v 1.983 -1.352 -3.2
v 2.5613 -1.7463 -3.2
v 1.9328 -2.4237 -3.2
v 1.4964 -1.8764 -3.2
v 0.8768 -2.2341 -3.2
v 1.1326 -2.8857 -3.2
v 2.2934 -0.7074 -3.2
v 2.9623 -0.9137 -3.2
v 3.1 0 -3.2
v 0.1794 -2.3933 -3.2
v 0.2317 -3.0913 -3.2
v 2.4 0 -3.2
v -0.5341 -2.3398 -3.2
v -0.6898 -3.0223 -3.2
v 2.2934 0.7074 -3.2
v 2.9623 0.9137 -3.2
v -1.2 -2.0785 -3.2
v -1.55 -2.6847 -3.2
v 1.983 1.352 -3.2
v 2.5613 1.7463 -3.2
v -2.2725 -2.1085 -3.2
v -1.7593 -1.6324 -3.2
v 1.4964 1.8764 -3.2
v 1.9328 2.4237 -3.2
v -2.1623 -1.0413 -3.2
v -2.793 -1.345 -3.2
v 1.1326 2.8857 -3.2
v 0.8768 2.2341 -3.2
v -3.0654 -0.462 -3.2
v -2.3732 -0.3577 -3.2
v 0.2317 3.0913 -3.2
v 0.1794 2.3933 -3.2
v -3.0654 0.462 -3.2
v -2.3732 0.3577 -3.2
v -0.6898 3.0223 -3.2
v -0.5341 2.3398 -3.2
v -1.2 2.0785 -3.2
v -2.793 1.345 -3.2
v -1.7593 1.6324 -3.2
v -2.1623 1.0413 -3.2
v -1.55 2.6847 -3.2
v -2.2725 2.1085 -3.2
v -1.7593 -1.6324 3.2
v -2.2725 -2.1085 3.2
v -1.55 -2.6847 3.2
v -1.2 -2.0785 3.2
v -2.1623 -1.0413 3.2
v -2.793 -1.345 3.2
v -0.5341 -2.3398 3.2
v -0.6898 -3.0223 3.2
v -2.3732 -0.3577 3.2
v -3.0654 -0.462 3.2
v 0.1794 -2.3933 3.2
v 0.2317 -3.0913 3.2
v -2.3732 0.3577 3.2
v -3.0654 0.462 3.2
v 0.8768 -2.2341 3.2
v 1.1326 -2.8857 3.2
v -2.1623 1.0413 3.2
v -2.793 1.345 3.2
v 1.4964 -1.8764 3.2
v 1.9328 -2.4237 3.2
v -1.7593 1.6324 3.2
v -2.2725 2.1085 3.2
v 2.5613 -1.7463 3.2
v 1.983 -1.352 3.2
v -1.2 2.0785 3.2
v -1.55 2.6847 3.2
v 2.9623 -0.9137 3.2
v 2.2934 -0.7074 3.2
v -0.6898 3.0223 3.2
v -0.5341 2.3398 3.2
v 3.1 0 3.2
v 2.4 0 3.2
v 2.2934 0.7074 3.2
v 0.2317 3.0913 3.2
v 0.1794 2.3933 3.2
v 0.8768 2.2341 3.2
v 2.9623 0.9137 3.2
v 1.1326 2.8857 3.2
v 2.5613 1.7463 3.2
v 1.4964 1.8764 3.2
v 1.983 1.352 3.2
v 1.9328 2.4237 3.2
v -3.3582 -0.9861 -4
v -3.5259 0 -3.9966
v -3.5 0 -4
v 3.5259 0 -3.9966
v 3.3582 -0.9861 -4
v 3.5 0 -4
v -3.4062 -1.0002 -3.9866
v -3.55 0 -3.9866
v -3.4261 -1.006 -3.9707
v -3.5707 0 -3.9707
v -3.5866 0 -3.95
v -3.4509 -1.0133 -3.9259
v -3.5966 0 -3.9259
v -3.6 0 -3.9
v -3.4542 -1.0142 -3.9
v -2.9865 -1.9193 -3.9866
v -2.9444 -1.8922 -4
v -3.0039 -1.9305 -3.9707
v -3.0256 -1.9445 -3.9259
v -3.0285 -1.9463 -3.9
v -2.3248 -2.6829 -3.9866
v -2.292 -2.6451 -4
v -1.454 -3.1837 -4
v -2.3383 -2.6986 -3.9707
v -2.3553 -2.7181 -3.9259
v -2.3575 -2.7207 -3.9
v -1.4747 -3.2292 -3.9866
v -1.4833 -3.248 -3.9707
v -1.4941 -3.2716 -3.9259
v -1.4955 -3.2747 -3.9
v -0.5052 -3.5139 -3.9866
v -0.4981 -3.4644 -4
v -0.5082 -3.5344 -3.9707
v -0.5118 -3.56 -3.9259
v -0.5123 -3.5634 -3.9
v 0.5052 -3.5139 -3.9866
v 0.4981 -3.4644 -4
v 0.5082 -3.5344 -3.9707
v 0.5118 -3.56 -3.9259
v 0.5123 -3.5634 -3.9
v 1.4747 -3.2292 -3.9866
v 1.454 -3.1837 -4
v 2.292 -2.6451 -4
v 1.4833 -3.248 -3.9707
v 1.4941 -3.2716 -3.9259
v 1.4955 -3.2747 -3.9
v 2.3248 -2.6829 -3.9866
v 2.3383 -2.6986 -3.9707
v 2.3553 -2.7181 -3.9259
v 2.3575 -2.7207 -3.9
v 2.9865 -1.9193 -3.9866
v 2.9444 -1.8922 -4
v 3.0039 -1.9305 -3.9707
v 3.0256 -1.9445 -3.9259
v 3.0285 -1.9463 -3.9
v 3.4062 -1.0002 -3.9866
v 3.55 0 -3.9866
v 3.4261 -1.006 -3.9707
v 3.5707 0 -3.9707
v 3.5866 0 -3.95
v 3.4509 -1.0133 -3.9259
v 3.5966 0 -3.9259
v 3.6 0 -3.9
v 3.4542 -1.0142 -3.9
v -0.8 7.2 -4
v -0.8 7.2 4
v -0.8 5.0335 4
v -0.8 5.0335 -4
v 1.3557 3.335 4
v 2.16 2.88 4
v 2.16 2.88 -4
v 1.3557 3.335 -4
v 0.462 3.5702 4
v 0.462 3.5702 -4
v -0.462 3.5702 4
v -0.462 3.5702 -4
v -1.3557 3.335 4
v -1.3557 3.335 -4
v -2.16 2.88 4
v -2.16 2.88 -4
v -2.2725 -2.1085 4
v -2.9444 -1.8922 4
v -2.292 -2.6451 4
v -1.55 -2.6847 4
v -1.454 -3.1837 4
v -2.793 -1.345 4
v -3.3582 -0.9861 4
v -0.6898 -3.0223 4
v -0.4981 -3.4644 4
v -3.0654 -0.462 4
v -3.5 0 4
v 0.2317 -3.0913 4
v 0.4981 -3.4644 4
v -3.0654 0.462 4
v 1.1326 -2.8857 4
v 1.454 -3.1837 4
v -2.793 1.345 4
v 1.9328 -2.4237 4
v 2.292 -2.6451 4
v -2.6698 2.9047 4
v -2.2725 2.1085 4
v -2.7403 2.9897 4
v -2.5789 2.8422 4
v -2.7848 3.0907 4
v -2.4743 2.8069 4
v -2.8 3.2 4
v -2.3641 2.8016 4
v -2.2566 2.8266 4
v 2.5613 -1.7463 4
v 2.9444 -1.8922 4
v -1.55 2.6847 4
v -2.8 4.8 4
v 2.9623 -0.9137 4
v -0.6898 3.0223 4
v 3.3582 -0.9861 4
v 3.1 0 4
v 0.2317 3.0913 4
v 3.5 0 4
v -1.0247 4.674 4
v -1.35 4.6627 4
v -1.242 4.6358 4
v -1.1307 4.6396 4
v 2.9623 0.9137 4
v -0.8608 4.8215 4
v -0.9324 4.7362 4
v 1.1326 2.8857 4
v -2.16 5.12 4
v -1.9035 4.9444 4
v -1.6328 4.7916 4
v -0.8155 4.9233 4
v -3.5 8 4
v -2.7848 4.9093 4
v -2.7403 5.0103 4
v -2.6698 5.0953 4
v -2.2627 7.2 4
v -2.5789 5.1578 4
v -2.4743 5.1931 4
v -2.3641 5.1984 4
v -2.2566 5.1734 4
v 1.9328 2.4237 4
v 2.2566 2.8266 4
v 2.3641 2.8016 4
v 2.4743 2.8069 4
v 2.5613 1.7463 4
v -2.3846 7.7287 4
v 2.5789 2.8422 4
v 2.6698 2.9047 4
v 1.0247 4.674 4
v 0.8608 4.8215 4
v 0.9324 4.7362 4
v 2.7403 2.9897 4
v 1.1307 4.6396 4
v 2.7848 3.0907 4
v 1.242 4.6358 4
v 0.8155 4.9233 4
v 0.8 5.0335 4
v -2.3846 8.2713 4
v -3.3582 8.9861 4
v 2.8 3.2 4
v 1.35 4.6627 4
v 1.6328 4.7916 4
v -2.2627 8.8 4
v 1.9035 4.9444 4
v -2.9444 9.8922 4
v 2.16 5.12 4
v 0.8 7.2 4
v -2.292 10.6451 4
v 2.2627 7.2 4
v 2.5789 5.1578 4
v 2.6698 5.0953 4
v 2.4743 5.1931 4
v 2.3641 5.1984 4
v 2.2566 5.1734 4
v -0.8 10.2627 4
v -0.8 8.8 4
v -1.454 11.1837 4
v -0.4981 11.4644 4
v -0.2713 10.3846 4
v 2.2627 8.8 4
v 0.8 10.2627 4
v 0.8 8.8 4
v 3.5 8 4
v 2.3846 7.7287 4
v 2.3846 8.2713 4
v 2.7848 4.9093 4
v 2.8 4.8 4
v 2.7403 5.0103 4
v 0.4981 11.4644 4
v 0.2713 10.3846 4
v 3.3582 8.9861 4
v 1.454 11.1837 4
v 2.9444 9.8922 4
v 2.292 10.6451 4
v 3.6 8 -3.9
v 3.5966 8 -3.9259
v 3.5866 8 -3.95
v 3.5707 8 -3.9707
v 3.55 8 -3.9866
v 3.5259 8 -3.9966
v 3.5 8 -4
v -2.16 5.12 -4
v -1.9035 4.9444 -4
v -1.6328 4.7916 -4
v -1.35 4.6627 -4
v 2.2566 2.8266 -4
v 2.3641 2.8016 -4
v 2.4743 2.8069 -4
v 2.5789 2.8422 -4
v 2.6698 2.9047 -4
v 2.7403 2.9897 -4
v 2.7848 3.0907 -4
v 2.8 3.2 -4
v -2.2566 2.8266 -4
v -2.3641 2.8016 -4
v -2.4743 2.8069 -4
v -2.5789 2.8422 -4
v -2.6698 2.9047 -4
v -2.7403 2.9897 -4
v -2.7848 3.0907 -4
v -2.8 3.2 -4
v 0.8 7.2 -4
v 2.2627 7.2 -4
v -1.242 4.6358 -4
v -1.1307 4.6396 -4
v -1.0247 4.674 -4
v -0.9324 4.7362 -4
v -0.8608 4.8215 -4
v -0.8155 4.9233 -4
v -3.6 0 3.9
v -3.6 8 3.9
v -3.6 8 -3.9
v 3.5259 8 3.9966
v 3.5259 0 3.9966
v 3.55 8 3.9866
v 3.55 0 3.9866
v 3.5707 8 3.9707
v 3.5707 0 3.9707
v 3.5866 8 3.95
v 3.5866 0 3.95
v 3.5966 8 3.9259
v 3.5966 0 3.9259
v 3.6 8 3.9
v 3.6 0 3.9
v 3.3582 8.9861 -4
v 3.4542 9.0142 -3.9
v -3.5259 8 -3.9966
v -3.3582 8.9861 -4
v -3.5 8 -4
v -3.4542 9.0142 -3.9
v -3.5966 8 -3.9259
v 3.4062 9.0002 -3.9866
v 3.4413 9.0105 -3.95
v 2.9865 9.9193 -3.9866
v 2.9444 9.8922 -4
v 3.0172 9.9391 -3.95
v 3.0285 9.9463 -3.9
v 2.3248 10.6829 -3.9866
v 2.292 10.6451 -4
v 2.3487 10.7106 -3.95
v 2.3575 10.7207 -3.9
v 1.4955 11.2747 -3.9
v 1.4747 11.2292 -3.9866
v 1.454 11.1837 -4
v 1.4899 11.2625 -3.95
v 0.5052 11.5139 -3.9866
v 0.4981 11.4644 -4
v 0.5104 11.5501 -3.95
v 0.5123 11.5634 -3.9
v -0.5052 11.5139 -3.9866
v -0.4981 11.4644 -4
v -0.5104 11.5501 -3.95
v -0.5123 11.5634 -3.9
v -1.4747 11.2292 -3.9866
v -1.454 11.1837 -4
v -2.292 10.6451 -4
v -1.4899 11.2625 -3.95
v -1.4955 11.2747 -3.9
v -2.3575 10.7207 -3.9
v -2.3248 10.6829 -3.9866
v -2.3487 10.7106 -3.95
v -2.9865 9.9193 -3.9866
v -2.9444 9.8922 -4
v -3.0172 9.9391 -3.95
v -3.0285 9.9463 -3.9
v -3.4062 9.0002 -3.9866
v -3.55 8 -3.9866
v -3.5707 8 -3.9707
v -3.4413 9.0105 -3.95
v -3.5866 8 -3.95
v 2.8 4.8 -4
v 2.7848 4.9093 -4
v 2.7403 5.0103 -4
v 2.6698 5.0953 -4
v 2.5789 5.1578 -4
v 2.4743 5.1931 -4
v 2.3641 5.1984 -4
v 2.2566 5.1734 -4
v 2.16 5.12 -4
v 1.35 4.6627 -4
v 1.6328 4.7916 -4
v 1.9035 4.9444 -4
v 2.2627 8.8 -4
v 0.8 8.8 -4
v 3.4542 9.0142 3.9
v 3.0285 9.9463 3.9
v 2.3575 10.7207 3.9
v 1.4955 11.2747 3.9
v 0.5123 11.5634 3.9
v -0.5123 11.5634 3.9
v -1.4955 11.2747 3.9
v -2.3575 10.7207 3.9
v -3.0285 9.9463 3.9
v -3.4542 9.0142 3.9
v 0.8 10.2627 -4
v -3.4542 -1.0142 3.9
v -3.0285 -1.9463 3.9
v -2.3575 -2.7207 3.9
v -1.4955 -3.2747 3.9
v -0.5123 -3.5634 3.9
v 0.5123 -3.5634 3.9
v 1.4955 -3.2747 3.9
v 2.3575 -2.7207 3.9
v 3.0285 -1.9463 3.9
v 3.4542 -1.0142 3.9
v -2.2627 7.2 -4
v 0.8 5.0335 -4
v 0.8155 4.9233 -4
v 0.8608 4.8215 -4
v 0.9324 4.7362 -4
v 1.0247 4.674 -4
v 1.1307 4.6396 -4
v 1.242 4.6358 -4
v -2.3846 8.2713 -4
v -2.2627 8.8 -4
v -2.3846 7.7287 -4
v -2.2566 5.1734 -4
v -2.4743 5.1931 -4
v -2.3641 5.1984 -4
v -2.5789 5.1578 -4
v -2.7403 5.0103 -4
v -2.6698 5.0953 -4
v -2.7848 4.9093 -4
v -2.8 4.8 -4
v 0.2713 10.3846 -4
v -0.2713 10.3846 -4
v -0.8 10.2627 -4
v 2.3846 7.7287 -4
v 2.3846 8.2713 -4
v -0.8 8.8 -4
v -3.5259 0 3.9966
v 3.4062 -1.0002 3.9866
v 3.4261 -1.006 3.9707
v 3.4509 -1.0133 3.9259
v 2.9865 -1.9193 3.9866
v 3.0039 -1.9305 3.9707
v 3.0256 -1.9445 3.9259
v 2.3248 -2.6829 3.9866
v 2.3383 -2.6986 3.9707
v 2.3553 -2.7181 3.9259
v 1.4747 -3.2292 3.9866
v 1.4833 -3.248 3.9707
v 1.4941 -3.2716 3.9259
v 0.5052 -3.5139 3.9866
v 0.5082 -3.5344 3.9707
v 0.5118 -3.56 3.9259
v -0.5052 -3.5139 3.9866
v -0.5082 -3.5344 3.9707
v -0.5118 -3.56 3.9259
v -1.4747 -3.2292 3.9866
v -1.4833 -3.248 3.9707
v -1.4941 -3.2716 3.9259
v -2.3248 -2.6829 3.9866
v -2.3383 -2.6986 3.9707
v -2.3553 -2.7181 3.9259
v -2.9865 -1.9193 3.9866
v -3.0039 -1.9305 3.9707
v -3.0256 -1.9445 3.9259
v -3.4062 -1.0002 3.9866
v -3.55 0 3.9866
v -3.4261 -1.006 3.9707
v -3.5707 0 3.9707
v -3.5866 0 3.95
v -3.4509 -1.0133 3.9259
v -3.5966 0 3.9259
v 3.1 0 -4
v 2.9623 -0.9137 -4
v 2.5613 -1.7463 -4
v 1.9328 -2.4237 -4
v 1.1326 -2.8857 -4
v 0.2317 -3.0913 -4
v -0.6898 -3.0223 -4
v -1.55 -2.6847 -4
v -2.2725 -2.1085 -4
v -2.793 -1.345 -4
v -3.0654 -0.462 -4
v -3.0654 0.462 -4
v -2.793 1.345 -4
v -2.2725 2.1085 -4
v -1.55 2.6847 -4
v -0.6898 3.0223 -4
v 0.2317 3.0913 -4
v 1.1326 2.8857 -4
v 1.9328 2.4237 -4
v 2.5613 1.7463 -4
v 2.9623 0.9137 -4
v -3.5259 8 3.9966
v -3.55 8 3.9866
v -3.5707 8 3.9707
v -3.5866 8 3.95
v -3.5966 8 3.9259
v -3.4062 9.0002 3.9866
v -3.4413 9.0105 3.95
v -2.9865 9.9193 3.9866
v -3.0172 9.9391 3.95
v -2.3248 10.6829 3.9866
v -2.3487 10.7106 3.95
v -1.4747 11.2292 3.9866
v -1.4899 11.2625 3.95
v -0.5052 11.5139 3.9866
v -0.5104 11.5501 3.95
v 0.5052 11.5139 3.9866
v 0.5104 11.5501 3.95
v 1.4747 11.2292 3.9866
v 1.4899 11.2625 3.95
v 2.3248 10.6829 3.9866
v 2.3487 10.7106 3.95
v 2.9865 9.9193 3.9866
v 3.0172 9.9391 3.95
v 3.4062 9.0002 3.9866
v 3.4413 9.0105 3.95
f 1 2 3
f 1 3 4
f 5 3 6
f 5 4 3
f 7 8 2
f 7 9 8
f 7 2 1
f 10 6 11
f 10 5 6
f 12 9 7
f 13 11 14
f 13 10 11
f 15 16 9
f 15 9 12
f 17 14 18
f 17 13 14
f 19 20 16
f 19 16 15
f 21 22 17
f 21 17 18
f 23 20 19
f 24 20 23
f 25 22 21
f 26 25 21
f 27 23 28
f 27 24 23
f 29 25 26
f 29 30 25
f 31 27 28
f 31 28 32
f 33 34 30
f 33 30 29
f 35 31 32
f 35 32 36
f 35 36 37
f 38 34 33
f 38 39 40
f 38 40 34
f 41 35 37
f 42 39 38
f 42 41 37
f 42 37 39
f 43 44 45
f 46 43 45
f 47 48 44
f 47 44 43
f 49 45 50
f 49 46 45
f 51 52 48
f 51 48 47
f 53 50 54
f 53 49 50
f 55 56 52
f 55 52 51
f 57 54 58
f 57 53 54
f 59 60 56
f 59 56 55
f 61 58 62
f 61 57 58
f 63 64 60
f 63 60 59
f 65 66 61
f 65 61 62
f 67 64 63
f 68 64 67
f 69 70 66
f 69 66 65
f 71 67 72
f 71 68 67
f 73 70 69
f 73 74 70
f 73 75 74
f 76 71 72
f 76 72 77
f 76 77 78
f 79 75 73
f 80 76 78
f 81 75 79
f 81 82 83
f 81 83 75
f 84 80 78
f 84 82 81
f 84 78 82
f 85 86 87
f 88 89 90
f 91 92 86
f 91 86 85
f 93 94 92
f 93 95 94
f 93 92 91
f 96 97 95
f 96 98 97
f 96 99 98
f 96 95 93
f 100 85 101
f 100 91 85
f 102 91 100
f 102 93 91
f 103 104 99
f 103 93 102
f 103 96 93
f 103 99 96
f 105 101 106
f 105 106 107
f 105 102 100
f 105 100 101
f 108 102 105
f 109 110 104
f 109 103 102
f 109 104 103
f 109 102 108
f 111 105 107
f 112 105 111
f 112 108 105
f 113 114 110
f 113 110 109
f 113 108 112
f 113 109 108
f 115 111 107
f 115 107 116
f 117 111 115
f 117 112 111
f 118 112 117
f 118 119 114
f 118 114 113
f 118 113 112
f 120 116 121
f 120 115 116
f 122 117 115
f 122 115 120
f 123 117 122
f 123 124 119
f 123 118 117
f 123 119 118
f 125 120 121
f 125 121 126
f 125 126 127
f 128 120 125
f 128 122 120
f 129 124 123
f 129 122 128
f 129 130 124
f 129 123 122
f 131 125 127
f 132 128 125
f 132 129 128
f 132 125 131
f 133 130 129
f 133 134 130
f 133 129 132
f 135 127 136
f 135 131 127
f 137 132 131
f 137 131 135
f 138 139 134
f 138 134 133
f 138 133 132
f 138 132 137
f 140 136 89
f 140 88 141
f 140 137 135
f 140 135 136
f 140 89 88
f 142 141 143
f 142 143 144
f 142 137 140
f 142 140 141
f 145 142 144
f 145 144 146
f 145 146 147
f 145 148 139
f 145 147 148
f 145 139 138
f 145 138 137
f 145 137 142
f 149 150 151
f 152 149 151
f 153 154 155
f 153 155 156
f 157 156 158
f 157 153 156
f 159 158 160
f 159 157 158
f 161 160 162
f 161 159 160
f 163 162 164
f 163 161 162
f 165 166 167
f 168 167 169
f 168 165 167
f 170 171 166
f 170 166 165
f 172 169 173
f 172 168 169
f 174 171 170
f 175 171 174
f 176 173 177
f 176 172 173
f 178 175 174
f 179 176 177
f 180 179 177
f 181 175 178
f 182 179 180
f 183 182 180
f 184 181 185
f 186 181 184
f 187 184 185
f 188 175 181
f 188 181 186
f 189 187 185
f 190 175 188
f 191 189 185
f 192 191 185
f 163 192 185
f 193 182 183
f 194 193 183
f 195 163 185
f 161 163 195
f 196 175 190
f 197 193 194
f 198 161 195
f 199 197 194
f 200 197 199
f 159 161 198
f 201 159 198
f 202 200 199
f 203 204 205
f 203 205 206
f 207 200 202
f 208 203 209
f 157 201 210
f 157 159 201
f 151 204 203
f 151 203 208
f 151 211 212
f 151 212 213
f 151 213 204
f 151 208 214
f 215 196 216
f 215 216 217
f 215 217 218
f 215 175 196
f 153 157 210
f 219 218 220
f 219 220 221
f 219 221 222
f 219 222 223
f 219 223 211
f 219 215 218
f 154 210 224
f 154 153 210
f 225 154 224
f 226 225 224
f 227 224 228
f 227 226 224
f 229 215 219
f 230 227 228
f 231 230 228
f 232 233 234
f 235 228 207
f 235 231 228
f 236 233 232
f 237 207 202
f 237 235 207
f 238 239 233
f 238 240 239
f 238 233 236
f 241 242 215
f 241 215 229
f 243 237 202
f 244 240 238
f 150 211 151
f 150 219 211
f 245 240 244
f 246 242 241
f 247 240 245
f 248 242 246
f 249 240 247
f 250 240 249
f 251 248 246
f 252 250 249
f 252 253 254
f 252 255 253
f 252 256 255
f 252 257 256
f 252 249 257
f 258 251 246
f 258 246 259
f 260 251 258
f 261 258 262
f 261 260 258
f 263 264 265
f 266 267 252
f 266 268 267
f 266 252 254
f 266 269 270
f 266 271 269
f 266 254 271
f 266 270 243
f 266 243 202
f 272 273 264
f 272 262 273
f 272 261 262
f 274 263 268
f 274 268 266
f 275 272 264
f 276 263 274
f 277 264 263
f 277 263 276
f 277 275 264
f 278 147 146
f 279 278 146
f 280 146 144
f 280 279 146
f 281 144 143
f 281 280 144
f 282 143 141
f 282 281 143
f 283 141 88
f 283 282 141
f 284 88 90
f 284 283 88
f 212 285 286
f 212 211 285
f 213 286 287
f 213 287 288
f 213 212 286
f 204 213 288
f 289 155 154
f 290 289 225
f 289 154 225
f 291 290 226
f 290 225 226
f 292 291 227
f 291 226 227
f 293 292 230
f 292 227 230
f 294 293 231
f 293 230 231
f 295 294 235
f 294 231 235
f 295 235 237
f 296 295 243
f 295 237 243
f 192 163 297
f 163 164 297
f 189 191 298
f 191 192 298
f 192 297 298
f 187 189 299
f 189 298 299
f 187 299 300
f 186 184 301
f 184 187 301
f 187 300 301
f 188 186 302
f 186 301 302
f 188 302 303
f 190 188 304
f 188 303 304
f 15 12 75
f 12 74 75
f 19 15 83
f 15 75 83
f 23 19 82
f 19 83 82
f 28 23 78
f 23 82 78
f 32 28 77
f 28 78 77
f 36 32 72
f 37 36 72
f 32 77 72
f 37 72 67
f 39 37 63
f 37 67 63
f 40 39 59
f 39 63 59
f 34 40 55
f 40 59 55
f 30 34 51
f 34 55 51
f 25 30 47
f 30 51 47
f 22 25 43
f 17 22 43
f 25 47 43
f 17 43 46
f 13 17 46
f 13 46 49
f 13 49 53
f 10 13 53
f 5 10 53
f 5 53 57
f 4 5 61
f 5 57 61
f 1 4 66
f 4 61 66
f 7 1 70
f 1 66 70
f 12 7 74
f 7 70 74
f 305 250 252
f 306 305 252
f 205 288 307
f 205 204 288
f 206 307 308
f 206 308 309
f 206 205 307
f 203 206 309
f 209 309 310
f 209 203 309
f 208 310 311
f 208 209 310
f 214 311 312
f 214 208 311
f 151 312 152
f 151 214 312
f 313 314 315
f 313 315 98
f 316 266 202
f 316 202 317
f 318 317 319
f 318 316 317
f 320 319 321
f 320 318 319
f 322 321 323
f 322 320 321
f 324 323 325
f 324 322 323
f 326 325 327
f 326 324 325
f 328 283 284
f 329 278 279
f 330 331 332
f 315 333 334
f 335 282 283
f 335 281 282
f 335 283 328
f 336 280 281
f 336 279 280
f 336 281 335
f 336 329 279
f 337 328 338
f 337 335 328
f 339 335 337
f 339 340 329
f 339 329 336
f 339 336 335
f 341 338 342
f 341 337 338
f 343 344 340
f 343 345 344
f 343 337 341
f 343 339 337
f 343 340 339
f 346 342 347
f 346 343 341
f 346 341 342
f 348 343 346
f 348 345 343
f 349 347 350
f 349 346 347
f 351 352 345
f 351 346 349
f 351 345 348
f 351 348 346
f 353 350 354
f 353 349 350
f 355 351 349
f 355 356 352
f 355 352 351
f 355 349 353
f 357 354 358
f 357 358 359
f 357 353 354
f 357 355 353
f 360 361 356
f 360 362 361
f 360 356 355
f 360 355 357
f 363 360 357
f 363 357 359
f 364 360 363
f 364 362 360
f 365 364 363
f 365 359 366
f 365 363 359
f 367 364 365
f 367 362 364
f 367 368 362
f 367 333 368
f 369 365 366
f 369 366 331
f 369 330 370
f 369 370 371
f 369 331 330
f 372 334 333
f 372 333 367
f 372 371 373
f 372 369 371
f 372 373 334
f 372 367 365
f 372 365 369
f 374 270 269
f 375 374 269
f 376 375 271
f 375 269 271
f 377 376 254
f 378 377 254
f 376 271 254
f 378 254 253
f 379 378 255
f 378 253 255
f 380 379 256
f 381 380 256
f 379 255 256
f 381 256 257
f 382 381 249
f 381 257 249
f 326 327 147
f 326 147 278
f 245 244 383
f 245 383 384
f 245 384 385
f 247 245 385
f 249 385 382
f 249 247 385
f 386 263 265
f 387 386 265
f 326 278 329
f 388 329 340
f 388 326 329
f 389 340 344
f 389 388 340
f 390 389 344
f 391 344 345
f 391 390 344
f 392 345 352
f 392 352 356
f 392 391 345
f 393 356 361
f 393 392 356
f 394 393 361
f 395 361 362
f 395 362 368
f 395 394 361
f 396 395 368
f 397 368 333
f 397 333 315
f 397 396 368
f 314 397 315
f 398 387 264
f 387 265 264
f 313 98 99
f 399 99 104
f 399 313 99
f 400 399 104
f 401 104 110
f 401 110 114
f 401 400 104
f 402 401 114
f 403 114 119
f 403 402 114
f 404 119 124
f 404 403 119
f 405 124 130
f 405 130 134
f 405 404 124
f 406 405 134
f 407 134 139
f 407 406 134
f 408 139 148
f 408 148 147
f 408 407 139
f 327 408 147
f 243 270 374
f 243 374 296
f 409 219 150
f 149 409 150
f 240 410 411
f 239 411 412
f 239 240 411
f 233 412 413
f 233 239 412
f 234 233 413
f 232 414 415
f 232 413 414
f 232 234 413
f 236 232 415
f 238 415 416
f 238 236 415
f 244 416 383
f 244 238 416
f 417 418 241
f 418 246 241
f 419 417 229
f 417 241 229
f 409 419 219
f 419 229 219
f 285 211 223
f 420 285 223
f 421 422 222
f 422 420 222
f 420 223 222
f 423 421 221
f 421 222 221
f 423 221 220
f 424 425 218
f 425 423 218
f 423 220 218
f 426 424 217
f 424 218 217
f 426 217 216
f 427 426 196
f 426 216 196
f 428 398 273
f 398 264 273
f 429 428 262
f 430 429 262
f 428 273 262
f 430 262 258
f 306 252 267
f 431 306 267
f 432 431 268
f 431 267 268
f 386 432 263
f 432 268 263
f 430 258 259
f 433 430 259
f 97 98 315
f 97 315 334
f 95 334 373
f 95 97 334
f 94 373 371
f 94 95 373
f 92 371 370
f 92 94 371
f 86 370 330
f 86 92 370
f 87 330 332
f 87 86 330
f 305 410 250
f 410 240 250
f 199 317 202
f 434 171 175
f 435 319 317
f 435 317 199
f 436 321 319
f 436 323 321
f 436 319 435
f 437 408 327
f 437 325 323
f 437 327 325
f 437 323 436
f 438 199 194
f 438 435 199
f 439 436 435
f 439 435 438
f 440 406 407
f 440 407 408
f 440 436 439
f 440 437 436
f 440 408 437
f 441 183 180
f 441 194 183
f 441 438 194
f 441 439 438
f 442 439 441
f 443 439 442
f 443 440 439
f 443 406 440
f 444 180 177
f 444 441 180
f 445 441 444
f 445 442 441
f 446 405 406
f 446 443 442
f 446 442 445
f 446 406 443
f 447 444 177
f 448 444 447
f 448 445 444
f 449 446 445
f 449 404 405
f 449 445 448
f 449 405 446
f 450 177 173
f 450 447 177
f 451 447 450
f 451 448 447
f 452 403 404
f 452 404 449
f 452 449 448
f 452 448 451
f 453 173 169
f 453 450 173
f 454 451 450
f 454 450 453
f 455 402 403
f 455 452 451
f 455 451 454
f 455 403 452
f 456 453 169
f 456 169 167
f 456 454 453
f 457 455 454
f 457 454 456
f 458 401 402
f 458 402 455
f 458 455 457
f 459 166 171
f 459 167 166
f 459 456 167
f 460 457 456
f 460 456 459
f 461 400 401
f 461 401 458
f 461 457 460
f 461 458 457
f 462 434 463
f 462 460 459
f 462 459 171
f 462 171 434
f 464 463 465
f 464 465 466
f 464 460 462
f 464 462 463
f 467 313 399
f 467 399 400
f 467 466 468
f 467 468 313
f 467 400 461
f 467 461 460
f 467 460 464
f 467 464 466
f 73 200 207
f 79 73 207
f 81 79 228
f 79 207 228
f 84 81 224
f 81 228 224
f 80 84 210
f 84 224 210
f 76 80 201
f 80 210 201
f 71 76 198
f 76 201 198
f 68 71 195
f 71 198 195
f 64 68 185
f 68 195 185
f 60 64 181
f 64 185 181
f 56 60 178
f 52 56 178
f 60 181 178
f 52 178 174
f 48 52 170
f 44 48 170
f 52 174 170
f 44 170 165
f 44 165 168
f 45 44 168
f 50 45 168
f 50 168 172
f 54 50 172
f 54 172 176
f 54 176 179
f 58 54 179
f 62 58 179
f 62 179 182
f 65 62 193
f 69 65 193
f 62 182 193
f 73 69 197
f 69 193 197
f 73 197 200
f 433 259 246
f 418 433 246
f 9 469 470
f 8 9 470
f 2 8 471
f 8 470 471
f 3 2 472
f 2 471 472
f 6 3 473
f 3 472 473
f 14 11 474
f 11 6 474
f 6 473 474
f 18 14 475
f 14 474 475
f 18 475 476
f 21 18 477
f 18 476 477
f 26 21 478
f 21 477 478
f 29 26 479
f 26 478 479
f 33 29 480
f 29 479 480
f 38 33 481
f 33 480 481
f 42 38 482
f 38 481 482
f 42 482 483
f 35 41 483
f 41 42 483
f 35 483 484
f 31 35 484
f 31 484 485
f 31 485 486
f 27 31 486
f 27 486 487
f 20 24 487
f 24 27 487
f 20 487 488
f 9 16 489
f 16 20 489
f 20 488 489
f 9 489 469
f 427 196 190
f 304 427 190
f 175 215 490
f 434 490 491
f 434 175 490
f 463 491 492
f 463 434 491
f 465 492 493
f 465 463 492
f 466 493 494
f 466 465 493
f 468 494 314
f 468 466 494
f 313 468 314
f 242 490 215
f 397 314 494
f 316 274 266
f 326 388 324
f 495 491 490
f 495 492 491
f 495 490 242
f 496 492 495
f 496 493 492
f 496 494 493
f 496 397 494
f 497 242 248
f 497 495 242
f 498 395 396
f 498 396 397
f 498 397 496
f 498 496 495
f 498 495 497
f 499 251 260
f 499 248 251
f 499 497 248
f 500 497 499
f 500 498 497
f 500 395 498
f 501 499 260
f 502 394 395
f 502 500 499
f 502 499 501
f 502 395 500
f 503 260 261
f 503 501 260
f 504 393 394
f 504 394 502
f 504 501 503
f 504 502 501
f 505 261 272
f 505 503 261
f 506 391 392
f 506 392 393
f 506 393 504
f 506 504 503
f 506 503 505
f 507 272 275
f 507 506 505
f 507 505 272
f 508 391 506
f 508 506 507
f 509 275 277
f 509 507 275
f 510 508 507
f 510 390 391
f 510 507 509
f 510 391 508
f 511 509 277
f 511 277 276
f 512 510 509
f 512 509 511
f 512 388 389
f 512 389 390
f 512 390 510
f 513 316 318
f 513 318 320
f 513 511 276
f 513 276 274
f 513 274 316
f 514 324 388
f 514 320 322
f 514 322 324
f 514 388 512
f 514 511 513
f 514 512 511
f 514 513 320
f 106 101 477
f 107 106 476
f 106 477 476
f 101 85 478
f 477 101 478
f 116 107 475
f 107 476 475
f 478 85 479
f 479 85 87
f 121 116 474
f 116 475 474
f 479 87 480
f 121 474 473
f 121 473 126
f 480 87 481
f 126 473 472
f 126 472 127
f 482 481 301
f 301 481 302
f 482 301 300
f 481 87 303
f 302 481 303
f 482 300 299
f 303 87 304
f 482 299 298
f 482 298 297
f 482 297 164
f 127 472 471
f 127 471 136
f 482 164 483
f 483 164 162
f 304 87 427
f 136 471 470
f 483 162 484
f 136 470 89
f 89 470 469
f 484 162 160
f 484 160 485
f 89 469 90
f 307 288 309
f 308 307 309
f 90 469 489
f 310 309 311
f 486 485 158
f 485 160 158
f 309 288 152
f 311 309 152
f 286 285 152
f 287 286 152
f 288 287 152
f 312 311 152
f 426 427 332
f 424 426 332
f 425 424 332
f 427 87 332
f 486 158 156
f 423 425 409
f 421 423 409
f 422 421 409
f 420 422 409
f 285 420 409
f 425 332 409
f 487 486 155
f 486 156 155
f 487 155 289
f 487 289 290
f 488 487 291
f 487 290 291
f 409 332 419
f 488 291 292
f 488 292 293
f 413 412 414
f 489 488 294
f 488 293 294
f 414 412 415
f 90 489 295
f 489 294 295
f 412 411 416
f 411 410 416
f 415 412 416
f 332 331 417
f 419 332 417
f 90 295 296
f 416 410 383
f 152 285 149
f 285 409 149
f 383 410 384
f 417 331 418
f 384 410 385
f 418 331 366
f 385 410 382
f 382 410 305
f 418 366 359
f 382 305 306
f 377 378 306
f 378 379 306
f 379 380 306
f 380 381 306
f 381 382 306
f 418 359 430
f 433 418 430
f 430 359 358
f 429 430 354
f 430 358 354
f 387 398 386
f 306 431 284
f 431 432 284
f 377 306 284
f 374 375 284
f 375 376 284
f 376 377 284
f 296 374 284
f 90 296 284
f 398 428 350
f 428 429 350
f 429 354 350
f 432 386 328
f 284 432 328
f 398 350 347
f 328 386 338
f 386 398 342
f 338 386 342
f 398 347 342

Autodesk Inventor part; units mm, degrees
ref_plane "YZ Plane" through (0, 0, 0) normal (1, 0, 0) x (0, 1, 0)
ref_plane "XZ Plane" through (0, 0, 0) normal (0, 1, 0) x (-1, 0, 0)
ref_plane "XY Plane" through (0, 0, 0) normal (0, 0, 1) x (1, 0, 0)
sketch "Sketch1" plane through (0, 0, 0) normal (0, 0, 1) x (1, 0, 0)
  line L0 (3.6, 0) -> (3.6, 8)
  line L1 (-3.6, 8) -> (-3.6, 0)
  arc A0 (3.6, 8) -> (-3.6, 8) centre (0, 8) ccw
  circle A1 centre (0, 8) radius 2.4 construction
  circle A2 centre (0, 8) radius 3.2 construction
  circle A3 centre (0, 0) radius 3.2
  circle A4 centre (0, 0) radius 2.4
  line L2 (0, 0) -> (0, 8) construction
  line L3 (-2.8, 5.7373) -> (-2.8, 2.2627)
  line L4 (2.8, 5.7373) -> (2.8, 2.2627)
  arc A5 (-2.8, 5.7373) -> (2.8, 5.7373) centre (0, 8) ccw
  arc A6 (2.8, 2.2627) -> (-2.8, 2.2627) centre (0, 0) ccw
  arc A7 (-3.6, 0) -> (3.6, 0) centre (0, 0) ccw
  line L5 (0.8, 4.49) -> (0.8, 7.2)
  line L6 (0.8, 7.2) -> (2.2627, 7.2)
  line L7 (2.2627, 8.8) -> (0.8, 8.8)
  line L8 (0.8, 8.8) -> (0.8, 10.2627)
  line L9 (-0.8, 10.2627) -> (-0.8, 8.8)
  line L10 (-0.8, 8.8) -> (-2.2627, 8.8)
  line L11 (-2.2627, 7.2) -> (-0.8, 7.2)
  line L12 (-0.8, 7.2) -> (-0.8, 4.49)
  arc A8 (-2.2627, 8.8) -> (-2.2627, 7.2) centre (0, 8) ccw
  arc A9 (0.8, 10.2627) -> (-0.8, 10.2627) centre (0, 8) ccw
  arc A10 (2.2627, 7.2) -> (2.2627, 8.8) centre (0, 8) ccw
  dimension "d8" = 4.8
  dimension "d9" = 6.4
  dimension "d32" = 7.2
  dimension "d34" = 8
  dimension "d36" = 0.8
  dimension "d52" = 1.6
extrude "Extrusion1" add sketch "Sketch1" along normal mid plane 8 contours A7 L1 A0 L0 | A3
sketch "Sketch6" plane through (0, 0, 4) normal (0, 0, 1) x (1, 0, 0)
  circle A0 centre (0, 0) radius 3.1
  circle A1 centre (0, 0) radius 2.4 projected
  dimension "d53" = 6.2
extrude "Extrusion7" cut sketch "Sketch6" against normal blind 0.8 contours A0 | A1
mirror "Mirror1" about plane through (0, 0, 0) normal (0, 0, 1) of "Extrusion7"
fillet "Fillet1" radius 0.1 6 edges at (0, 11.6, 4) (3.6, 4, 4) (-3.6, 4, 4) (0, 11.6, -4) (-3.6, 4, -4) (3.6, 4, -4)
fillet "Fillet1" radius 0.4 6 edges at (-2.8, 5.7373, 0) (-2.8, 2.2627, 0) (2.8, 2.2627, 0) (2.8, 5.7373, 0) (0.8, 4.49, 0) (-0.8, 4.49, 0)
equation "\"d8\" = kd"
equation "\"d9\" = tsd"
equation "\"d32\" = tlad"
equation "\"d34\" = lu"
equation "\"d52\" = axlet"
equation "\"d14\" = lu"
equation "\"d41\" = tsl"
equation "\"d45\" = lf"
equation "\"d46\" = tf"
equation "\"kd\" = 4.8"
equation "\"tsd\" = 6.4"
equation "\"tlad\" = 7.2"
equation "\"lu\" = 8"
equation "\"axlet\" = 1.6"
equation "\"tsl\" = 0.8"
equation "\"lf\" = 0.1"
equation "\"tf\" = 0.4"
properties part number "60483-Black" material "ABS Plastic"
